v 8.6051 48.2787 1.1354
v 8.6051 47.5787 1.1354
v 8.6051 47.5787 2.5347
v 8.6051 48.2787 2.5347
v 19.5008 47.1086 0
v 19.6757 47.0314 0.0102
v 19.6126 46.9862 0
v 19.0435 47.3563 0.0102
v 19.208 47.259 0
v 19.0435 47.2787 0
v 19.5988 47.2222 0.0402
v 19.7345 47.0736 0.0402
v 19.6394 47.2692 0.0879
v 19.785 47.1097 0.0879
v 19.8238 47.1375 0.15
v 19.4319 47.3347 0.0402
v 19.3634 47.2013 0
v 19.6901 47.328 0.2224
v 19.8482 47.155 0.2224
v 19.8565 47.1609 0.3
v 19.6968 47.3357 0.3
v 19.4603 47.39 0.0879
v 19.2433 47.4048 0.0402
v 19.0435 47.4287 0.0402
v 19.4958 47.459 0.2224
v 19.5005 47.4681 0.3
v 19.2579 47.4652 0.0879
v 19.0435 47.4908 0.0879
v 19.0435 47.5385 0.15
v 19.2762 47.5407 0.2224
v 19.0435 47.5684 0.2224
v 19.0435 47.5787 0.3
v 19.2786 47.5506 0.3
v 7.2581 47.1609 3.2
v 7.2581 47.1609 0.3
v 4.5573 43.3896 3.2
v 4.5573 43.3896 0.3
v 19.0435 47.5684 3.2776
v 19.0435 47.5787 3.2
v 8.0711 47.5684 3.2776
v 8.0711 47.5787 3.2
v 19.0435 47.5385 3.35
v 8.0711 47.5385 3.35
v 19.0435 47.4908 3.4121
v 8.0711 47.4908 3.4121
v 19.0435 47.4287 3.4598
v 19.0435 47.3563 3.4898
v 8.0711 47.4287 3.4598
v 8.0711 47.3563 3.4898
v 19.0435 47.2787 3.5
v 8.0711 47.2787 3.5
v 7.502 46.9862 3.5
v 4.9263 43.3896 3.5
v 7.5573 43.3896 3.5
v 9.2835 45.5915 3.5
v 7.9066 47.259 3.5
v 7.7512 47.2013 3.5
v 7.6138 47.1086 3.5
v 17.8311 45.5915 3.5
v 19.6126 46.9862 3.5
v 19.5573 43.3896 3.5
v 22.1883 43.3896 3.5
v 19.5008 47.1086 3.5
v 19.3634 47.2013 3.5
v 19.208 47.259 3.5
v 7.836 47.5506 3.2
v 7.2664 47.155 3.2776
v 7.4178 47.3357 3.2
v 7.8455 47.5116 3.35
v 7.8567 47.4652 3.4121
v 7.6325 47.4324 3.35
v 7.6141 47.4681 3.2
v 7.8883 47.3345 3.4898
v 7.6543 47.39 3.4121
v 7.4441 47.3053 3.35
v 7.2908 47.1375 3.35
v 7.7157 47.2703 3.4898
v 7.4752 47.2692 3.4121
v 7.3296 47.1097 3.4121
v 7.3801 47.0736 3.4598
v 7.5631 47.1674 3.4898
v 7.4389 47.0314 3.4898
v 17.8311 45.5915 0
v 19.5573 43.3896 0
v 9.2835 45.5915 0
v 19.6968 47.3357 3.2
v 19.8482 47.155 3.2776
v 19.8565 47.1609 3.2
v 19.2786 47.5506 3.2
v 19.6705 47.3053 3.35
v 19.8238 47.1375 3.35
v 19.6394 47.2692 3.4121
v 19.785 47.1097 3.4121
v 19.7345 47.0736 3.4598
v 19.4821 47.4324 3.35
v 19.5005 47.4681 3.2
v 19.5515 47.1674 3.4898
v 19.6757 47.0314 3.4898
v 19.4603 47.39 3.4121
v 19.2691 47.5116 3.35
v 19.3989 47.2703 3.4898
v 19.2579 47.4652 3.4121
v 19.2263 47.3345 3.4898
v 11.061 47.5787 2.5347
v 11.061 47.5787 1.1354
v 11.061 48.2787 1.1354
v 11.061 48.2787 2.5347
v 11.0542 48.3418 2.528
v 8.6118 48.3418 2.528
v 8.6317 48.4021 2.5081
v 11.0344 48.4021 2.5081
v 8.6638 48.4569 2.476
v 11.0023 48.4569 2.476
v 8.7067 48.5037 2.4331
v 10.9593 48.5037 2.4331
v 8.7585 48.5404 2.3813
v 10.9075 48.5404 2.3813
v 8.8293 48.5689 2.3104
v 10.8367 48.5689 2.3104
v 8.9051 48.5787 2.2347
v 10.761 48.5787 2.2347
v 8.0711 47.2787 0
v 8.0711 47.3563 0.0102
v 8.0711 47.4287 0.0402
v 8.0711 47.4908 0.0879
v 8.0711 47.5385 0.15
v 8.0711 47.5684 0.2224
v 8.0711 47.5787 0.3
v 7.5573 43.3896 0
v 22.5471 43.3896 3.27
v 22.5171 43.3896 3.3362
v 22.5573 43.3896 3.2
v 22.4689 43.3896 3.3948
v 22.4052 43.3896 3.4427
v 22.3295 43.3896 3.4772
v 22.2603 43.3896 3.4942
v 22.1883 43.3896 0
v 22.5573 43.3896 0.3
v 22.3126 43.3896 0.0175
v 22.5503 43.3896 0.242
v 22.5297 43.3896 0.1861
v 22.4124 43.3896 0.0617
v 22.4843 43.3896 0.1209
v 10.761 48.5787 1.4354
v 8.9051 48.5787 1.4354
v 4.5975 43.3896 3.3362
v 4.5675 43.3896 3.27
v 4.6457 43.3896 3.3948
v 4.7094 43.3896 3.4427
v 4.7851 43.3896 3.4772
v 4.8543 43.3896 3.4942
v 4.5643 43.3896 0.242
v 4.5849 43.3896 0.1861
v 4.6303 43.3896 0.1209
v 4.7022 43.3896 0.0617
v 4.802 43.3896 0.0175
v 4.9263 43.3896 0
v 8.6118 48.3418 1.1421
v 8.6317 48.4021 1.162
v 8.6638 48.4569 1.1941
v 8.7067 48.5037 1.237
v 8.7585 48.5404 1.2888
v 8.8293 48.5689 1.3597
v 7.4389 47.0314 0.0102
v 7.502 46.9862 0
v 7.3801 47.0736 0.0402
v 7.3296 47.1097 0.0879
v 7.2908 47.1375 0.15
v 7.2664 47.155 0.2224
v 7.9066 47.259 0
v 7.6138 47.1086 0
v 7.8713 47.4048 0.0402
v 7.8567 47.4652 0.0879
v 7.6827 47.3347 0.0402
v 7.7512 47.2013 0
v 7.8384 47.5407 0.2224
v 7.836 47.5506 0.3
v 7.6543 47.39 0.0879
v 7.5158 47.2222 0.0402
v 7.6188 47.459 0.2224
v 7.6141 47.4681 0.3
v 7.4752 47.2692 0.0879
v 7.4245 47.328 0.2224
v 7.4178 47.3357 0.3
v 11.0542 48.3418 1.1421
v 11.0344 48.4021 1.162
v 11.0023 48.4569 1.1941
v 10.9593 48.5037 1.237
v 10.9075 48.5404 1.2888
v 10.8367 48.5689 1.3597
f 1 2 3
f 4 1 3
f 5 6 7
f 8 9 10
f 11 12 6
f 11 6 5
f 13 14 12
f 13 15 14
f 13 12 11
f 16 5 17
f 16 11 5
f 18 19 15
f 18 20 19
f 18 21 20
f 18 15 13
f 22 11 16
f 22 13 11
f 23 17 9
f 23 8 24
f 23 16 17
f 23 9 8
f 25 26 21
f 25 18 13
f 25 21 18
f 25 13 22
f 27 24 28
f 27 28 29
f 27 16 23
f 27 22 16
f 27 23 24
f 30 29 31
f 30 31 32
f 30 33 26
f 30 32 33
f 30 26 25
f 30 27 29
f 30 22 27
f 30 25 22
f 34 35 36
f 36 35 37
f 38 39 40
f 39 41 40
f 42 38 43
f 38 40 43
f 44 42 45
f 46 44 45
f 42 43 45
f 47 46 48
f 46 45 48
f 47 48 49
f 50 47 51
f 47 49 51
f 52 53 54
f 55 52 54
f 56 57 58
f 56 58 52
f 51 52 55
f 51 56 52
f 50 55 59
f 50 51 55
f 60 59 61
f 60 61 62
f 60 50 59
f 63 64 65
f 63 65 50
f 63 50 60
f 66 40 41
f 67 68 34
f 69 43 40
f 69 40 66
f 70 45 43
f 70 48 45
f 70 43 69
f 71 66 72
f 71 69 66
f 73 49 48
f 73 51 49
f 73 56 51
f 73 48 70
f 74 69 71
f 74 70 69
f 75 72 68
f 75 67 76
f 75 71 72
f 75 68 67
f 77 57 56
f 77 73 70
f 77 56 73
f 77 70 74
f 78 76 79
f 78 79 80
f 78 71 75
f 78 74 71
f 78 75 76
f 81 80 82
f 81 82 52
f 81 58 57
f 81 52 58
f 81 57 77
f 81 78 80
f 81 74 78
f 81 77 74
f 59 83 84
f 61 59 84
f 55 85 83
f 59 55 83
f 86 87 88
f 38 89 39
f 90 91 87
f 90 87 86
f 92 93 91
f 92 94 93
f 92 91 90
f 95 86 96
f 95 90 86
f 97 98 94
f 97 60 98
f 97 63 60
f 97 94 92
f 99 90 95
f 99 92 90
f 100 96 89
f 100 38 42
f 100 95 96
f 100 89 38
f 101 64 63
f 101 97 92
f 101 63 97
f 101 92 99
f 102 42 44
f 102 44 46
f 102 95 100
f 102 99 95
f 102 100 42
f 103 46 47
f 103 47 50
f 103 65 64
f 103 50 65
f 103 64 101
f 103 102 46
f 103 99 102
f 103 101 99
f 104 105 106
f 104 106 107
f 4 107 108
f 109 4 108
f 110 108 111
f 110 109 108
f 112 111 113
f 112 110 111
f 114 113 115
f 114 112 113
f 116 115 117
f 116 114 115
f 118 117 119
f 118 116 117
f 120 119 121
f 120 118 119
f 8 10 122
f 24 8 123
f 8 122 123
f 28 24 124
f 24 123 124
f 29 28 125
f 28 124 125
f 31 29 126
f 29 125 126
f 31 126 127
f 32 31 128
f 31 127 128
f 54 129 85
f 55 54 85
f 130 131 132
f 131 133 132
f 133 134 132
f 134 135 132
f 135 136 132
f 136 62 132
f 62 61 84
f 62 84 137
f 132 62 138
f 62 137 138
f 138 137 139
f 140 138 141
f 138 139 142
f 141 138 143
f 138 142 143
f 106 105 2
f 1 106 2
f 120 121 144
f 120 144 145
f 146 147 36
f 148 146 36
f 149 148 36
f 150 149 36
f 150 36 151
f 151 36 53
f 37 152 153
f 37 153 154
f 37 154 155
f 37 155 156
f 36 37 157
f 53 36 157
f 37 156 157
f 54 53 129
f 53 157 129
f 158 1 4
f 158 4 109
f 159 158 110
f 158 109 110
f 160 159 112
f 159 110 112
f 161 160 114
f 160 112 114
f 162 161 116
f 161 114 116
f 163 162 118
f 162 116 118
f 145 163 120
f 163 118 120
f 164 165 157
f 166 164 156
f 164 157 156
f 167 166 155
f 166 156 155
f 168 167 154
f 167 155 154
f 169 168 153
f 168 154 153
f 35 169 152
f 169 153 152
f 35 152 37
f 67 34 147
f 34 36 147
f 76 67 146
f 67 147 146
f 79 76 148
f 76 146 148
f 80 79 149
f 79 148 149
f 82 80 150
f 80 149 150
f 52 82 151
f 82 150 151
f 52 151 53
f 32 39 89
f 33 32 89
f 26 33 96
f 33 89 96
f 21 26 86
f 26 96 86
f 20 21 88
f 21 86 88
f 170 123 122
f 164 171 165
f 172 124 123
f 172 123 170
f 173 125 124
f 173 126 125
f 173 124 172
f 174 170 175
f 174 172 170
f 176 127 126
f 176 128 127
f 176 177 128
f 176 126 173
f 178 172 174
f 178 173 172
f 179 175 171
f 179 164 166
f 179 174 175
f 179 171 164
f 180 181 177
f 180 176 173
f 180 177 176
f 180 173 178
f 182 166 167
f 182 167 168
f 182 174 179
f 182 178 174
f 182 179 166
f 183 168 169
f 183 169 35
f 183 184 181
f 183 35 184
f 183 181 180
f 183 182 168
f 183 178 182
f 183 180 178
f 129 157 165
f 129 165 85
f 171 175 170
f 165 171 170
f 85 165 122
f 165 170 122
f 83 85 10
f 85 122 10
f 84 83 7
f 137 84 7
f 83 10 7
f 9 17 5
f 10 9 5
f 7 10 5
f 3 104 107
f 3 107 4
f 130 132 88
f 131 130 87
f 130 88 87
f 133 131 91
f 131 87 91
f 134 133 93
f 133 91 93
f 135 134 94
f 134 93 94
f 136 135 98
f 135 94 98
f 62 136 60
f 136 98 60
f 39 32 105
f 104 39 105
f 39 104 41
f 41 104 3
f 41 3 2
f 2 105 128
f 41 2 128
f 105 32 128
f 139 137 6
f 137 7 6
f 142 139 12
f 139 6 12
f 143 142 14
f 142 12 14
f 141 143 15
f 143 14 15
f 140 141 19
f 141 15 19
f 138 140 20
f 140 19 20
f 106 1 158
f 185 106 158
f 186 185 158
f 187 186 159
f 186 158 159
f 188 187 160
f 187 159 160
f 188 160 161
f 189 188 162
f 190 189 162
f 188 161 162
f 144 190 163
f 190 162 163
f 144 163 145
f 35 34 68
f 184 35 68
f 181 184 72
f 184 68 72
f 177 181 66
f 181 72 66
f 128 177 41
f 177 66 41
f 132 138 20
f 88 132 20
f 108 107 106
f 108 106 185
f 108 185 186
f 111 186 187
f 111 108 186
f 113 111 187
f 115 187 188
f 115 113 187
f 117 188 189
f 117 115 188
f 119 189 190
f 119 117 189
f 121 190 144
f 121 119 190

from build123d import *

# Parameters (mm, degrees)
F1_DEPTH = 3.5
F2_W     = 2.45587
F2_H     = 1.399275
F3_DEPTH = 1
F4_R     = 1
F5_R     = 0.3


with BuildPart() as f1:
    # F0 (on Top) → F1 (new body)
    with BuildSketch(Plane.XY):
        Polygon((7.557304, 47.57867), (4.557304, 43.389559), (7.557304, 43.389559), (9.283487, 45.591526), (13.557304, 45.591526), (17.831121, 45.591526), (19.557304, 43.389559), (22.557304, 43.389559), (19.557304, 47.57867), (13.557304, 47.57867), align=None)
    extrude(amount=F1_DEPTH)

    # F2 (on face) → F3 (join)
    with BuildSketch(Plane(origin=(0, 47.57867, 0), x_dir=(-1, 0, 0), z_dir=(0, 1, 0))):
        with Locations((-9.833018, 1.835053)):
            Rectangle(F2_W, F2_H)
    extrude(amount=F3_DEPTH)

    # F4
    f4_edges = [f1.edges().sort_by_distance(p)[0] for p in [
        (7.557304, 47.57867, 1.75),
        (19.557304, 47.57867, 1.75),
    ]]
    fillet(f4_edges, radius=F4_R)

    # F5
    f5_edges = [f1.edges().sort_by_distance(p)[0] for p in [
        (5.907715, 45.275233, 3.5),
        (13.557304, 47.57867, 0),
        (9.833018, 48.57867, 2.534691),
        (11.060953, 48.57867, 1.835054),
        (8.605083, 48.57867, 1.835054),
        (9.833018, 48.57867, 1.135416),
    ]]
    fillet(f5_edges, radius=F5_R)


solid = f1.part
